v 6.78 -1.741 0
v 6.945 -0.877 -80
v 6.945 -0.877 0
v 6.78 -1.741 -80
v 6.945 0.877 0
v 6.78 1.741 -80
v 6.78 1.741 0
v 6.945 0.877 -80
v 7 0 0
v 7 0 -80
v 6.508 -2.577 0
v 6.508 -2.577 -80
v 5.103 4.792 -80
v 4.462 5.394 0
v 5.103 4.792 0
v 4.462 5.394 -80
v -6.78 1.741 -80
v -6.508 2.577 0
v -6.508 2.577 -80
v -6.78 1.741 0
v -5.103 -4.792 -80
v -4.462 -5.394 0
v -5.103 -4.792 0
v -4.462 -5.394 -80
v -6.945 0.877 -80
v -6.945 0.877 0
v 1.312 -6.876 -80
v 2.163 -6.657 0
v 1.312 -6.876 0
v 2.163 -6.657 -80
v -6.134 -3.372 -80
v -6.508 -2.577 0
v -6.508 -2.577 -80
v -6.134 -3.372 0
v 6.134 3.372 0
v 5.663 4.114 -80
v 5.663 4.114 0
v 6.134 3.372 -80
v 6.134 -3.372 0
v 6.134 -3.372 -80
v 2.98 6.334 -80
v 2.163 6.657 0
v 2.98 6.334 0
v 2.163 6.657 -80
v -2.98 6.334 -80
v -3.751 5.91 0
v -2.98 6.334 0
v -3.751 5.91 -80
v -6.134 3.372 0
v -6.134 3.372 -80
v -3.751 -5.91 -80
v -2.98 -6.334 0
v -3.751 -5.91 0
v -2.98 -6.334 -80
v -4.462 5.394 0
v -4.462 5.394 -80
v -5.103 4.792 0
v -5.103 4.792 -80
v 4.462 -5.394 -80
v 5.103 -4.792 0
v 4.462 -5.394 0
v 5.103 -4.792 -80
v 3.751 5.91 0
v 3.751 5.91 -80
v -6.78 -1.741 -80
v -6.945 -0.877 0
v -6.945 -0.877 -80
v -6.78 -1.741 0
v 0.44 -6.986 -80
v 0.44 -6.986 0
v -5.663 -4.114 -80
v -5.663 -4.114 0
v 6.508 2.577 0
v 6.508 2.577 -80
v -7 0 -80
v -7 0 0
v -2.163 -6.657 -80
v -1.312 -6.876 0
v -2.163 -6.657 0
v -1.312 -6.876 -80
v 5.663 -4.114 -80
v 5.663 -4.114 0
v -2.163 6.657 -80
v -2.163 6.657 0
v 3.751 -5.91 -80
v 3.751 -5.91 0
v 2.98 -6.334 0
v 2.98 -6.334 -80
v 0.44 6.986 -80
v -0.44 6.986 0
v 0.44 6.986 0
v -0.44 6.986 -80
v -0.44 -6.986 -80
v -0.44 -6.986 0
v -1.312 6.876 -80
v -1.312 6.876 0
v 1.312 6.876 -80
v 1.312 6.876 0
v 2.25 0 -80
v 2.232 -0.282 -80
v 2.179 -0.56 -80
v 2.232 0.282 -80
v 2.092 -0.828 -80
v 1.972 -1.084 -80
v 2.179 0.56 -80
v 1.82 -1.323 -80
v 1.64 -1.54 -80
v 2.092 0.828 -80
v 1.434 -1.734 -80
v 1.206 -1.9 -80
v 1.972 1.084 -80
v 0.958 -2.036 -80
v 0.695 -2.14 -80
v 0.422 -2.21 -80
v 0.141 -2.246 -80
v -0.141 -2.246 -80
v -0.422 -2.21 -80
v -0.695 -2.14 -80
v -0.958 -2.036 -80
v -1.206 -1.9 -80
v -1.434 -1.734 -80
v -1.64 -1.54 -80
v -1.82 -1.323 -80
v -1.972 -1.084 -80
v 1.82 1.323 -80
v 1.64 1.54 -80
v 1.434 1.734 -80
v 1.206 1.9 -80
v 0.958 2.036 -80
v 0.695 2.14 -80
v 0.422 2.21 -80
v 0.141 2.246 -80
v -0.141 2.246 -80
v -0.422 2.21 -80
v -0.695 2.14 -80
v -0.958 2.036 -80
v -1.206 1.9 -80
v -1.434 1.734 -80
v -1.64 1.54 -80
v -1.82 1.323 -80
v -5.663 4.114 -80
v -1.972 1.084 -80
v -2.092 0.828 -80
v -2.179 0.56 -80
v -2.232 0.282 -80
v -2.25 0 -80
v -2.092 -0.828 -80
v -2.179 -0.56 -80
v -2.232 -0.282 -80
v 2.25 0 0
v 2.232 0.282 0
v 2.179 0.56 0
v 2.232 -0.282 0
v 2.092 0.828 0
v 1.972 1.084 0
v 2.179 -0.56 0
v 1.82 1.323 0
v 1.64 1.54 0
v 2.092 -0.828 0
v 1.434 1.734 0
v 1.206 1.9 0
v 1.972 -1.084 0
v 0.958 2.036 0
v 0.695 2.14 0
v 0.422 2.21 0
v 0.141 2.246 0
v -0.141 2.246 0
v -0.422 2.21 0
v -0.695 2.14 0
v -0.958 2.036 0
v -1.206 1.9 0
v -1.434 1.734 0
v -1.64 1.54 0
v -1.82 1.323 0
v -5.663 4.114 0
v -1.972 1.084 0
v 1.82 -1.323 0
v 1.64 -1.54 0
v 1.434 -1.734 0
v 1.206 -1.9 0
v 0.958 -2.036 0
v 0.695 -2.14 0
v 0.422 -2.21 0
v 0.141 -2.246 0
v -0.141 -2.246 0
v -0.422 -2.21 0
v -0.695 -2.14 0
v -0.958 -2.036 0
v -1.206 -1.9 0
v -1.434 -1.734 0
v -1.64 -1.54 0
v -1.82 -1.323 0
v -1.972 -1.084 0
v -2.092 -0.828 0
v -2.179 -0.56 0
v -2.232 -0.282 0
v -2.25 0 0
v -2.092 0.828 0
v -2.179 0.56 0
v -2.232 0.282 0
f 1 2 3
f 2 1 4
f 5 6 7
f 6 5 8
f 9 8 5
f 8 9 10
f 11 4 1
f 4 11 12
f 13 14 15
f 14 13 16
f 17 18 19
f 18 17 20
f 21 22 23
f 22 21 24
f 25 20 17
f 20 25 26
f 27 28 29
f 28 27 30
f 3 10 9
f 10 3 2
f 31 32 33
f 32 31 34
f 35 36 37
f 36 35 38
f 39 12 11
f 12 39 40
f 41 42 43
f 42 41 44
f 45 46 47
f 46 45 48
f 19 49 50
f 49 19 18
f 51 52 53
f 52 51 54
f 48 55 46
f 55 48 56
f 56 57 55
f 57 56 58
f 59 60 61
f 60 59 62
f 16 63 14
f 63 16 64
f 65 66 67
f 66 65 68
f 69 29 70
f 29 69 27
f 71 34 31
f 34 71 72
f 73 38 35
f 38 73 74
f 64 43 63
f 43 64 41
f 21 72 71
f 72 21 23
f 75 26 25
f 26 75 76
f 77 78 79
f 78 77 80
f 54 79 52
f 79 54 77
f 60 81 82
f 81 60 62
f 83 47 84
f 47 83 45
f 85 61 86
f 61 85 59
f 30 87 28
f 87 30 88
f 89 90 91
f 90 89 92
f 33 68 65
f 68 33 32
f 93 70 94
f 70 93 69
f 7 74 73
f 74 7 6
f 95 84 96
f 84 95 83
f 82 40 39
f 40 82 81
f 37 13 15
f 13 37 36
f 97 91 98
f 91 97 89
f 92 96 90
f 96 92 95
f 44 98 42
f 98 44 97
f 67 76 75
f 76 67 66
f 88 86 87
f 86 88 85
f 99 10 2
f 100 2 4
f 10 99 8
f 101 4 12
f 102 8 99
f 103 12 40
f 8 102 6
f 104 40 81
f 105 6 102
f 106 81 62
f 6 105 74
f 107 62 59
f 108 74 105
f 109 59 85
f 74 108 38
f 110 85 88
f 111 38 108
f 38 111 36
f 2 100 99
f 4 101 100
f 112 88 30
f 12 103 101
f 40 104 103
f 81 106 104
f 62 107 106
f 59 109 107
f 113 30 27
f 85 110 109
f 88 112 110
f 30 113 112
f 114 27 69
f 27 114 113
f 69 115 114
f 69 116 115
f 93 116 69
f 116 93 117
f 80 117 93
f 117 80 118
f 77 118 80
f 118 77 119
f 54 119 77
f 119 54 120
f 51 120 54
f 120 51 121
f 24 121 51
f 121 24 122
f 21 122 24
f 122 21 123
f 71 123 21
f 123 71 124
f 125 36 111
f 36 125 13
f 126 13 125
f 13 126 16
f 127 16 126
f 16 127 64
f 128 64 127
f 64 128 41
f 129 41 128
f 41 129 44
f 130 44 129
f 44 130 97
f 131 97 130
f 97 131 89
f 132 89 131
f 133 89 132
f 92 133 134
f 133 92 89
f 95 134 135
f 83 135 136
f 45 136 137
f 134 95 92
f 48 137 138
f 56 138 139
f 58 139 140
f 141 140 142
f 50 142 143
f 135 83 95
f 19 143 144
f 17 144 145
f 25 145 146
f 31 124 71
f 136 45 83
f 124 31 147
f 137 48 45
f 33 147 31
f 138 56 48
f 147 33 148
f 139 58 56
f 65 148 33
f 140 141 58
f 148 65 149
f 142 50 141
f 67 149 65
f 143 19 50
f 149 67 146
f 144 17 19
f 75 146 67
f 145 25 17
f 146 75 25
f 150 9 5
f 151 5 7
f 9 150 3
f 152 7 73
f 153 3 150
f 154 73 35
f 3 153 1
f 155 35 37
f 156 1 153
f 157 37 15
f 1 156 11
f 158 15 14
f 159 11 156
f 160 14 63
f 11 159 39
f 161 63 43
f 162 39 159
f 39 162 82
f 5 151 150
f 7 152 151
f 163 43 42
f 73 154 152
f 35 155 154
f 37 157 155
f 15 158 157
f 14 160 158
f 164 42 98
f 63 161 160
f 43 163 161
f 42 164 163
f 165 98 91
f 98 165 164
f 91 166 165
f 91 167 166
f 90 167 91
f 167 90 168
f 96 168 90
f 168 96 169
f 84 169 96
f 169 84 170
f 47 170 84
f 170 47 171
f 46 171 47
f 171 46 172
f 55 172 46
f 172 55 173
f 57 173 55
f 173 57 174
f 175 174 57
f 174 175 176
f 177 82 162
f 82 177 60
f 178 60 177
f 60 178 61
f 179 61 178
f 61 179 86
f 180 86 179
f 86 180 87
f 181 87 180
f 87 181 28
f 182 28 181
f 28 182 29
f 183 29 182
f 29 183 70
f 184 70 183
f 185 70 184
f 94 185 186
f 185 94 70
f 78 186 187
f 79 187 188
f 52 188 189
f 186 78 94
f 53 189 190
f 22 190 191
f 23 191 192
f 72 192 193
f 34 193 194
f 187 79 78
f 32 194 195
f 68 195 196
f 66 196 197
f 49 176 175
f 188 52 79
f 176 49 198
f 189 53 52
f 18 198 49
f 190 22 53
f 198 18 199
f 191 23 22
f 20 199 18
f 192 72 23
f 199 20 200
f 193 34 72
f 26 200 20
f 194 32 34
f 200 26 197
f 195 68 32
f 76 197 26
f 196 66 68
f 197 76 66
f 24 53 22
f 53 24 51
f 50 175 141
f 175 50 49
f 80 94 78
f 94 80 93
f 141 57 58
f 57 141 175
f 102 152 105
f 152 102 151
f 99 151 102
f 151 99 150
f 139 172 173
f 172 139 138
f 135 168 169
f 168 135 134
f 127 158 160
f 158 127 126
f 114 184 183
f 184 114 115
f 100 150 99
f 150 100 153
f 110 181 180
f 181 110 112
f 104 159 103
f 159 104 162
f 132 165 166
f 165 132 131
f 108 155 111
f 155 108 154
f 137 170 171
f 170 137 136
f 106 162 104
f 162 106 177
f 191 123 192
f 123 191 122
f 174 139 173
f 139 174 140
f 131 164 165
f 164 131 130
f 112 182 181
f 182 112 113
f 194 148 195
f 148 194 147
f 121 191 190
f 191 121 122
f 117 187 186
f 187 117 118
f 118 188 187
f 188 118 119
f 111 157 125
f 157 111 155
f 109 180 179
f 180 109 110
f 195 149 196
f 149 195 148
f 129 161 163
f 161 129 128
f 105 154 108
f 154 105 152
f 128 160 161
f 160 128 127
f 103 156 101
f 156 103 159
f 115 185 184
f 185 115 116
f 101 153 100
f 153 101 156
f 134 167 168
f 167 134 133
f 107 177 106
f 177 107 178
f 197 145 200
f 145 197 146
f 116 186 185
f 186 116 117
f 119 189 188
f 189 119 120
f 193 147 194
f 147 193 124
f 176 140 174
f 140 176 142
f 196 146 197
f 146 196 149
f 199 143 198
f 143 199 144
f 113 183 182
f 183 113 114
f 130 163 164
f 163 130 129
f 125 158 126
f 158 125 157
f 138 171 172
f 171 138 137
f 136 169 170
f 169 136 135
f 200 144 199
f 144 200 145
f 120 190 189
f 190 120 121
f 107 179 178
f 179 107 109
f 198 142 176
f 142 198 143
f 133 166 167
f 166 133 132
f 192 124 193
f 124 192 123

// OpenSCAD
$fn = 50;


difference() {
	union() {
		translate(v = [0, 0, -80.0000000000]) {
			cylinder(h = 80, r = 7.0000000000);
		}
		cylinder(h = 0, r = 10.0000000000);
	}
	union() {
		#translate(v = [0, 0, -80]) {
			cylinder(h = 80, r = 2.2500000000);
		}
	}
}
